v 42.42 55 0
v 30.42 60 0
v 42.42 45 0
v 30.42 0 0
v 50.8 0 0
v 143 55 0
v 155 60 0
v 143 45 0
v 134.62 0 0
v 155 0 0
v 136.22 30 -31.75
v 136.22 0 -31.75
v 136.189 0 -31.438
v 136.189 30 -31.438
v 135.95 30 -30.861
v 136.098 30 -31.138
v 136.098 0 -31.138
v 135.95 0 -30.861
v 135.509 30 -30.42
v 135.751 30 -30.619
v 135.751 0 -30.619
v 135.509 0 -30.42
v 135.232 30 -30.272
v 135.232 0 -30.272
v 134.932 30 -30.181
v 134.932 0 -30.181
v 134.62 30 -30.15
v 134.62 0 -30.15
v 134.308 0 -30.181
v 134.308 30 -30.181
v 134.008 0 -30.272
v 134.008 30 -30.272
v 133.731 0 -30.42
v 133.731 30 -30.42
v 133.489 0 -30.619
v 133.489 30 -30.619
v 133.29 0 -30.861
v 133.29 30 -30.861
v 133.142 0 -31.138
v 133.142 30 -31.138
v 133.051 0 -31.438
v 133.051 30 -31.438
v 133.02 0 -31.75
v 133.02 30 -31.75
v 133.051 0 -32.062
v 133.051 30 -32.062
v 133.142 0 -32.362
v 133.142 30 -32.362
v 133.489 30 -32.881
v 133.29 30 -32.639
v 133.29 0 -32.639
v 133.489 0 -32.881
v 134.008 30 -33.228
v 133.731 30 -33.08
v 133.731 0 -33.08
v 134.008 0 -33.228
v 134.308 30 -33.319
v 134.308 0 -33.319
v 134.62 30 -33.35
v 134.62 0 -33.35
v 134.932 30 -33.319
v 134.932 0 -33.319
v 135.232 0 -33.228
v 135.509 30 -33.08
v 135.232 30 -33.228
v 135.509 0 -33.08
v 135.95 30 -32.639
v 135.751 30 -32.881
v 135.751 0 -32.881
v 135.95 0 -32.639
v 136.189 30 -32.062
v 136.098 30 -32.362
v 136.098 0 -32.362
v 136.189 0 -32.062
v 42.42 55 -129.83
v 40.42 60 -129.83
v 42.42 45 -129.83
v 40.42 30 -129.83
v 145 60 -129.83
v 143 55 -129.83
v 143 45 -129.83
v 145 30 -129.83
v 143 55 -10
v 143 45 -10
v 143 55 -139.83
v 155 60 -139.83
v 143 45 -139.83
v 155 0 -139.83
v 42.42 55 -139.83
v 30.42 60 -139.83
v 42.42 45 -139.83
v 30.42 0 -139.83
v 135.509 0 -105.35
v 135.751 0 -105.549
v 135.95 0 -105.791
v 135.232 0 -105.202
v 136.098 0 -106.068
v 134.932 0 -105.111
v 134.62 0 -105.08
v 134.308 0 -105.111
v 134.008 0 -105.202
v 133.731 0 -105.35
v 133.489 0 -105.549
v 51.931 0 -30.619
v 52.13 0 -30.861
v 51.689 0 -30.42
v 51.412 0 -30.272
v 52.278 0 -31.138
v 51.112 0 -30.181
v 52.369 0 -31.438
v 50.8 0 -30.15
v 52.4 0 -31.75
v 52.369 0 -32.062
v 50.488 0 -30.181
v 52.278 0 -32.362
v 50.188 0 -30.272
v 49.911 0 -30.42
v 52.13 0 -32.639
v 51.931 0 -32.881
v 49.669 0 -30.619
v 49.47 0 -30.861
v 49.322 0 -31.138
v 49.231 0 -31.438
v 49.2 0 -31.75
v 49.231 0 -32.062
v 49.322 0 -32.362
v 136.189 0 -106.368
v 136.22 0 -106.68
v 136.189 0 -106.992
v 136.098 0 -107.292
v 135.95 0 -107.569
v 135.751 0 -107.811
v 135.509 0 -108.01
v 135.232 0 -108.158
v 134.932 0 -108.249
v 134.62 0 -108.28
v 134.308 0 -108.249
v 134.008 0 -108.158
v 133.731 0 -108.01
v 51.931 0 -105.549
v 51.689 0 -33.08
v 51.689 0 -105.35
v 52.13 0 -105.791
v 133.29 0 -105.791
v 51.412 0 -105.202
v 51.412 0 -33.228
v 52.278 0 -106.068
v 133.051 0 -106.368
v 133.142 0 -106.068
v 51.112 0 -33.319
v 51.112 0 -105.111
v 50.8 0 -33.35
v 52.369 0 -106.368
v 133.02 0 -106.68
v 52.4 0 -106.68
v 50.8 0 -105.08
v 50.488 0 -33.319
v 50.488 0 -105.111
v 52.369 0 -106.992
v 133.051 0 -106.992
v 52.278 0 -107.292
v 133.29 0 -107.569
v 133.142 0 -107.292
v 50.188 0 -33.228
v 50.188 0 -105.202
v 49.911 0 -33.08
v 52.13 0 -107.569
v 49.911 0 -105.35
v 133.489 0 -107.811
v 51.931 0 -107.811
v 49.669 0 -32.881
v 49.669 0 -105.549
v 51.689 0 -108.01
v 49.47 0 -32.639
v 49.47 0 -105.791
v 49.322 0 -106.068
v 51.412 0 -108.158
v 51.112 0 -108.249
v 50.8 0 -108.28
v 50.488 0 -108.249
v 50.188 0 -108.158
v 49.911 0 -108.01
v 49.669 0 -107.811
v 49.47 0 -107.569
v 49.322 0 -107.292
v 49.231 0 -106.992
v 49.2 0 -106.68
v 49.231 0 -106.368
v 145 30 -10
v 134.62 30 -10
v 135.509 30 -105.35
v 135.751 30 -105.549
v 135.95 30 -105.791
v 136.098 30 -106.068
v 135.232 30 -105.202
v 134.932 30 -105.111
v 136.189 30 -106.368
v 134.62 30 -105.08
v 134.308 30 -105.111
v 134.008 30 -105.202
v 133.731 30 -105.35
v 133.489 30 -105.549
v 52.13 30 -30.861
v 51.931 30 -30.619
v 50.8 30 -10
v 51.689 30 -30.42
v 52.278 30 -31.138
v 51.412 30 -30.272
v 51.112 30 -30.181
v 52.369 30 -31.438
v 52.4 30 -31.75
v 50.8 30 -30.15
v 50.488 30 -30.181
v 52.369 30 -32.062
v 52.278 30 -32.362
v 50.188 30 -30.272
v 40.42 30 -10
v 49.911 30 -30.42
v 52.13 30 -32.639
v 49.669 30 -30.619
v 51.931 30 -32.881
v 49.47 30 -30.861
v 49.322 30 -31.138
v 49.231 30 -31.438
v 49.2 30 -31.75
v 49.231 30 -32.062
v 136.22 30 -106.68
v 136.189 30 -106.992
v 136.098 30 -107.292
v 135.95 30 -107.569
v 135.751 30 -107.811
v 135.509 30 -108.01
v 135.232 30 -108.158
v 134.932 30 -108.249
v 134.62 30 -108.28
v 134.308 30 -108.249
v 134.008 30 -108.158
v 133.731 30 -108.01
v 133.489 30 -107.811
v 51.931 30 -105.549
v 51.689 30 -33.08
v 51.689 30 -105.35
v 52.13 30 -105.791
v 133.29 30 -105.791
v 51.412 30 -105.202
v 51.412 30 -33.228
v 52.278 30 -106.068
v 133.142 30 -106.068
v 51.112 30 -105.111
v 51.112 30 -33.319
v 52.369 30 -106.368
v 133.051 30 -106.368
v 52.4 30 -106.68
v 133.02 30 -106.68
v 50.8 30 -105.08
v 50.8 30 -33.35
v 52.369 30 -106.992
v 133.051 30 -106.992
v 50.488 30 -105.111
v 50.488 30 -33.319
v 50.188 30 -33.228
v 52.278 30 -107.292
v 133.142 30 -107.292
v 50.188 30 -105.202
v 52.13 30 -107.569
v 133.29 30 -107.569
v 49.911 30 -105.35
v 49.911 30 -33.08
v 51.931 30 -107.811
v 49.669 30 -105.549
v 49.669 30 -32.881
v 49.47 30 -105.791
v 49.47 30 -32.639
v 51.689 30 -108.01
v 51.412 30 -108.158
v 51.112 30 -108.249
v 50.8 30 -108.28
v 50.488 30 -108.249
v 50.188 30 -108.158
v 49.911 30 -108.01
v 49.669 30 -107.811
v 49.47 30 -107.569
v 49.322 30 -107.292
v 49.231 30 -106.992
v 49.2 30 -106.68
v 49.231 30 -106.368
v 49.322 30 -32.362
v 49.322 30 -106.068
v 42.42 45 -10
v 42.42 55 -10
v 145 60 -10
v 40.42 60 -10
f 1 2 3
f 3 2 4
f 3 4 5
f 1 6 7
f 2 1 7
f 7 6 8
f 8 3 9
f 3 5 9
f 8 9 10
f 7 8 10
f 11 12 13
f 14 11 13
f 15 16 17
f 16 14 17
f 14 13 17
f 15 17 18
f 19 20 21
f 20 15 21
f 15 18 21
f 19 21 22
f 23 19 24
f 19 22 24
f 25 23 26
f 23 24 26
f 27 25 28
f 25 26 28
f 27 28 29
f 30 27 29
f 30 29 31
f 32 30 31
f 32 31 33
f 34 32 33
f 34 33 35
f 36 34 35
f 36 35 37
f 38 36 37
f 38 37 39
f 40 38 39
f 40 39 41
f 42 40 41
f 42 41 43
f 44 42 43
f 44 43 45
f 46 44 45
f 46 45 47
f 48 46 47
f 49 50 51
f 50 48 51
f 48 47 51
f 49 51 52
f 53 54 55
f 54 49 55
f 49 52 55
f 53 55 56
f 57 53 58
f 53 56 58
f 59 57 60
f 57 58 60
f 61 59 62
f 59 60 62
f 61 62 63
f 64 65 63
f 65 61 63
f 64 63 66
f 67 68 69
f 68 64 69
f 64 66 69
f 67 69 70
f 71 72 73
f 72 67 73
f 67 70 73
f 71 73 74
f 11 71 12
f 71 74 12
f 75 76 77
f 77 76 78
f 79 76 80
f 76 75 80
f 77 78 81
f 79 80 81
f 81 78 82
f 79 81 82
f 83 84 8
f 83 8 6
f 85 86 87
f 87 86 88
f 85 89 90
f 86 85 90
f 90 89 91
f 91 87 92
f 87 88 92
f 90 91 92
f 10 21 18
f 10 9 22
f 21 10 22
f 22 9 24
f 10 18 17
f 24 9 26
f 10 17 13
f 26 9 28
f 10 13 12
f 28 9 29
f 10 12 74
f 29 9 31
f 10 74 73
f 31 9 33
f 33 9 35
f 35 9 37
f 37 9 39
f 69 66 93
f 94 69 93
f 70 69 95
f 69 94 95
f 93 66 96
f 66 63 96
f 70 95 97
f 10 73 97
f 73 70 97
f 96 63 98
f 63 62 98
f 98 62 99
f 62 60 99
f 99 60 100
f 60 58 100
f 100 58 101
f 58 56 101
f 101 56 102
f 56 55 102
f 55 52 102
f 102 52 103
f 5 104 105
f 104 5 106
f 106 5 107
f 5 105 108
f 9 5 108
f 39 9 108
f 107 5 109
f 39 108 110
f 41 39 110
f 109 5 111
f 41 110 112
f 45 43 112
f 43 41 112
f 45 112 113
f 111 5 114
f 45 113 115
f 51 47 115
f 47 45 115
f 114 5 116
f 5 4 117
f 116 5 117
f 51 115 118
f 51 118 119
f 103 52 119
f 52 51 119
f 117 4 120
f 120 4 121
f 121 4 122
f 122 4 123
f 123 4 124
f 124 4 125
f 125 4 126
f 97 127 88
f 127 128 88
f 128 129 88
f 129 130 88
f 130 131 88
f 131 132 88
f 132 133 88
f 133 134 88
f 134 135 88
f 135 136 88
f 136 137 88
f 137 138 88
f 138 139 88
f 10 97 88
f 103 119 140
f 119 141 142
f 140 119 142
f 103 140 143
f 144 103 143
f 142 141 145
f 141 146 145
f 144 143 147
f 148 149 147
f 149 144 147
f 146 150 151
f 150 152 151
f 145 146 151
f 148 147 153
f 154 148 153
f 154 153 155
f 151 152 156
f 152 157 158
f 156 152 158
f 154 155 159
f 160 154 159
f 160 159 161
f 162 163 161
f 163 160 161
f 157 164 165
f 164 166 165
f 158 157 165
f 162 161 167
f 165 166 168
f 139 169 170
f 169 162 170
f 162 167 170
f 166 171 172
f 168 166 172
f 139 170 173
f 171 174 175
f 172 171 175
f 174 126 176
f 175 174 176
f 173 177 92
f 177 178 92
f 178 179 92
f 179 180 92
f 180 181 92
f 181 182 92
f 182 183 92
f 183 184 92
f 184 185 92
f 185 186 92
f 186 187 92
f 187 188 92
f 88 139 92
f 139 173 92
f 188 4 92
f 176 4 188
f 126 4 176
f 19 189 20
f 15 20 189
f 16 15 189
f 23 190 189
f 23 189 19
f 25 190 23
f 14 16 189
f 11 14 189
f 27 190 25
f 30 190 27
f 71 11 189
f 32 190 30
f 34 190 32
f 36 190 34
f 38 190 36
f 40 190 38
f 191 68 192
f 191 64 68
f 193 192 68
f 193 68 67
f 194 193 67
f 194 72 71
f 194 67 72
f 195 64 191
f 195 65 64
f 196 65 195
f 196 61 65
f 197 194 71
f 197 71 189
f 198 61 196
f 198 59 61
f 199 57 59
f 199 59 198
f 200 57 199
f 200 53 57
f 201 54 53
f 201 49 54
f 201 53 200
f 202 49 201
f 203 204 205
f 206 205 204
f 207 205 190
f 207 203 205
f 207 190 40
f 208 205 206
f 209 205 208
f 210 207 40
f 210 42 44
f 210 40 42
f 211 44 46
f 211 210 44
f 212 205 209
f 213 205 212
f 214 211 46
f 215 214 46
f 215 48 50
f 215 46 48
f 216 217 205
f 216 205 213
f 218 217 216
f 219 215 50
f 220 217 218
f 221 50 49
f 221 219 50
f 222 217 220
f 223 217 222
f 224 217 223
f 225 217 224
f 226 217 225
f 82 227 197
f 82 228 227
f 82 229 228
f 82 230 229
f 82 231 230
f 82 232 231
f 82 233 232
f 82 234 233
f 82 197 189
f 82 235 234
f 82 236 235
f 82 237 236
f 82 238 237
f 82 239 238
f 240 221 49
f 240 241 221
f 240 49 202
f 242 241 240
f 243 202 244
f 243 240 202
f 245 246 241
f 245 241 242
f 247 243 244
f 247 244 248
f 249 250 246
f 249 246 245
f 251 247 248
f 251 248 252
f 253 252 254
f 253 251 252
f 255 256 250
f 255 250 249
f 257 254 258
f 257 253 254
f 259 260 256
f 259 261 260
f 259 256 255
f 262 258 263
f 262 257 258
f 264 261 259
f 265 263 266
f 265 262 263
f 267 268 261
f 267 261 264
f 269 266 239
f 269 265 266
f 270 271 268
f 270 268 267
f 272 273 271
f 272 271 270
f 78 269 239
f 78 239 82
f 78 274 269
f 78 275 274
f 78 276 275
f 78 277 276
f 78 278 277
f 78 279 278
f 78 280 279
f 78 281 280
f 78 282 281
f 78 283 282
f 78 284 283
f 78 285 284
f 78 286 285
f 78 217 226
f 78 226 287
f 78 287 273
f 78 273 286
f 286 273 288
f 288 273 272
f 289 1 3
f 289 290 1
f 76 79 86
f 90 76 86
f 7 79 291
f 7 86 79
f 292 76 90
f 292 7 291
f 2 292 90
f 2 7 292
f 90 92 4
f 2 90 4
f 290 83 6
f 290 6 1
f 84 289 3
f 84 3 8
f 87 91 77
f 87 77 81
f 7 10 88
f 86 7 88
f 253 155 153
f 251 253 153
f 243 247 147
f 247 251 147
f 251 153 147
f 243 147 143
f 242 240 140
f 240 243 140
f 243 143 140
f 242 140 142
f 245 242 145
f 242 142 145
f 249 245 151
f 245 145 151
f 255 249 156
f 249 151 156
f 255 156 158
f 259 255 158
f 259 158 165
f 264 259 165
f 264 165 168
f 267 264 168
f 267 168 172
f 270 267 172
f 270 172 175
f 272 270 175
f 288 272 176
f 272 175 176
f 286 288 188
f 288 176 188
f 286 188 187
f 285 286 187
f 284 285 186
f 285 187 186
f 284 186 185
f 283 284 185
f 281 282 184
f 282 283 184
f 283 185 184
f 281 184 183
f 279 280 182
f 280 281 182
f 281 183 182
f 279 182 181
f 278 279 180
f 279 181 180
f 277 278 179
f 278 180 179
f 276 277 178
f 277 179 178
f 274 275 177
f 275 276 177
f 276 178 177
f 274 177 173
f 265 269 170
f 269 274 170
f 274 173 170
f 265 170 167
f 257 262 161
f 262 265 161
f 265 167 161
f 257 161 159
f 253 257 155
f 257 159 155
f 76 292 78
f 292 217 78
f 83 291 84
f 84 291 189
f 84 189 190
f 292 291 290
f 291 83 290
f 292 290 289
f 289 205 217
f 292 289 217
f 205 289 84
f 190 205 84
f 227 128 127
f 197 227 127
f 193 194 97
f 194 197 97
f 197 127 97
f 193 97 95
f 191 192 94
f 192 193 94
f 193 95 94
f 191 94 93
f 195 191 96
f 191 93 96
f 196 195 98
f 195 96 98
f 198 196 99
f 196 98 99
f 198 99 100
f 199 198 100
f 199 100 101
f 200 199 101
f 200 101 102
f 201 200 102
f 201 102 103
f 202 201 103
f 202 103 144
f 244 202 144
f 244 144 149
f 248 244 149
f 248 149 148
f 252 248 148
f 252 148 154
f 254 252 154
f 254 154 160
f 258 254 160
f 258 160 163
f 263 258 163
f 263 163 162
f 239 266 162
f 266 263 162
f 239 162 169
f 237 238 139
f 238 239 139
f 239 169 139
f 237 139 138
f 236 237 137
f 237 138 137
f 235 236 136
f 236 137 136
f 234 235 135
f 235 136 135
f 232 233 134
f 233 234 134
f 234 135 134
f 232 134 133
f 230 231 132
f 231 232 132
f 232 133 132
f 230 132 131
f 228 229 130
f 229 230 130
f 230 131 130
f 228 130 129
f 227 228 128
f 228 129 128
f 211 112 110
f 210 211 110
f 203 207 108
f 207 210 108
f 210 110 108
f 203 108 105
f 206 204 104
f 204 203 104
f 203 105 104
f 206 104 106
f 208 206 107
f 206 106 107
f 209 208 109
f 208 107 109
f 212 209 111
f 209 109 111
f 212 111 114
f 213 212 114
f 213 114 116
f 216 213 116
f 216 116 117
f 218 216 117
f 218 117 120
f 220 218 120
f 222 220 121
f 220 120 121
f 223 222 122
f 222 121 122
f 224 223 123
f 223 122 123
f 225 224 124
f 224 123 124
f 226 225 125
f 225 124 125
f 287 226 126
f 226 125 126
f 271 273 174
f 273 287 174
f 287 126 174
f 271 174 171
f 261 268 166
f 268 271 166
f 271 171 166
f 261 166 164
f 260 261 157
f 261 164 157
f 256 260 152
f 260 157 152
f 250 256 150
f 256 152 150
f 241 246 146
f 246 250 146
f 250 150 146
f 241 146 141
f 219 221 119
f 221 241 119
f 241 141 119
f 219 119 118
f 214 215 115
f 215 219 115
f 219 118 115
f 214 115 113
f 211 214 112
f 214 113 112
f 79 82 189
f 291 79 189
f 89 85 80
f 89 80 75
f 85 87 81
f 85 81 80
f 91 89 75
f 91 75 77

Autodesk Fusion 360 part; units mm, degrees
sketch "Sketch1" plane through (0, 0, 0) normal (0, 1, 0) x (1, 0, 0)
  line L0 (0, 0) -> (150, 0)
  line L1 (150, 0) -> (150, 150)
  line L2 (150, 150) -> (0, 150)
  line L3 (0, 150) -> (0, 0)
  line L4 (0, 0) -> (134.62, 0)
  line L5 (134.62, 0) -> (134.62, 31.75)
  circle A0 centre (134.62, 31.75) radius 1.6
  line L6 (134.62, 0) -> (134.62, 106.68)
  circle A1 centre (134.62, 106.68) radius 1.6
  line L7 (0, 0) -> (50.8, 0)
  line L8 (50.8, 0) -> (50.8, 106.68)
  line L9 (50.8, 0) -> (50.8, 31.75)
  circle A2 centre (50.8, 106.68) radius 1.6
  circle A3 centre (50.8, 31.75) radius 1.6
  dimension "d1" = 150
  dimension "d2" = 150
  dimension "d3" = 134.62
  dimension "d4" = 31.75
  dimension "d5" = 3.2
  dimension "d6" = 106.68
  dimension "d7" = 3.2
  dimension "d8" = 50.8
  dimension "d9" = 106.68
  dimension "d10" = 31.75
  dimension "d11" = 3.2
  dimension "d12" = 3.2
extrude "Extrude1" add sketch "Sketch1" along normal blind 10
extrude "Extrude2" add 1 faces at (106.3029, 10, -57.1038) along direction (0, 1, 0) blind 20
extrude "Extrude3" cut 1 faces at (0, 10, -100) along direction (1, 0, 0) blind 35.42
extrude "Extrude4" cut 1 faces at (111.8067, 10, -150) along direction (0, 0, 1) blind 10.17
extrude "Extrude5" add 1 faces at (35.42, 10, -93.22) along direction (-1, 0, 0) blind 5
extrude "Extrude6" add 1 faces at (150, 10, -46.61) along direction (1, 0, 0) blind 5
sketch "Sketch2" plane through (0, 30, 0) normal (0, 1, 0) x (-1, 0, 0)
  circle A0 centre (-50.8, -106.68) radius 1.6
  circle A1 centre (-134.62, -31.75) radius 1.6
  circle A2 centre (-50.8, -31.75) radius 1.6
  circle A3 centre (-134.62, -106.68) radius 1.6
  line L0 (-155, -139.83) -> (-30.42, -139.83)
  line L1 (-30.42, -139.83) -> (-30.42, 0)
  line L2 (-30.42, 0) -> (-155, 0)
  line L3 (-155, 0) -> (-155, -139.83)
  line L4 (-30.42, -139.83) -> (-30.42, -129.83)
  line L5 (-155, 0) -> (-145, 0)
  line L6 (-40.42, -129.83) -> (-145, -129.83)
  line L7 (-145, -129.83) -> (-145, -10)
  line L8 (-145, -10) -> (-40.42, -10)
  line L9 (-40.42, -10) -> (-40.42, -129.83)
  dimension "d26" = 10
  dimension "d27" = 10
extrude "Extrude7" add sketch "Sketch2" along normal blind 30 contours L0 L1 L2 L3 L4 L5
sketch "Sketch3" plane through (0, 0, -139.83) normal (0, 0, -1) x (-1, 0, 0)
  line L0 (-155, 60) -> (-155, 0)
  line L1 (-155, 0) -> (-30.42, 0)
  line L2 (-30.42, 0) -> (-30.42, 60)
  line L3 (-30.42, 60) -> (-155, 60)
  line L4 (-155, 60) -> (-155, 55)
  line L5 (-155, 55) -> (-143, 55)
  line L6 (-30.42, 60) -> (-30.42, 55)
  line L7 (-30.42, 55) -> (-42.42, 55)
  line L8 (-42.42, 55) -> (-42.42, 45)
  line L9 (-143, 55) -> (-42.42, 55)
  line L10 (-42.42, 55) -> (-42.42, 45)
  line L11 (-42.42, 45) -> (-143, 45)
  line L12 (-143, 45) -> (-143, 55)
  dimension "d30" = 12
  dimension "d31" = 12
extrude "Extrude8" cut sketch "Sketch3" against normal blind 200 contours L8 L9 L10 L11 L12
